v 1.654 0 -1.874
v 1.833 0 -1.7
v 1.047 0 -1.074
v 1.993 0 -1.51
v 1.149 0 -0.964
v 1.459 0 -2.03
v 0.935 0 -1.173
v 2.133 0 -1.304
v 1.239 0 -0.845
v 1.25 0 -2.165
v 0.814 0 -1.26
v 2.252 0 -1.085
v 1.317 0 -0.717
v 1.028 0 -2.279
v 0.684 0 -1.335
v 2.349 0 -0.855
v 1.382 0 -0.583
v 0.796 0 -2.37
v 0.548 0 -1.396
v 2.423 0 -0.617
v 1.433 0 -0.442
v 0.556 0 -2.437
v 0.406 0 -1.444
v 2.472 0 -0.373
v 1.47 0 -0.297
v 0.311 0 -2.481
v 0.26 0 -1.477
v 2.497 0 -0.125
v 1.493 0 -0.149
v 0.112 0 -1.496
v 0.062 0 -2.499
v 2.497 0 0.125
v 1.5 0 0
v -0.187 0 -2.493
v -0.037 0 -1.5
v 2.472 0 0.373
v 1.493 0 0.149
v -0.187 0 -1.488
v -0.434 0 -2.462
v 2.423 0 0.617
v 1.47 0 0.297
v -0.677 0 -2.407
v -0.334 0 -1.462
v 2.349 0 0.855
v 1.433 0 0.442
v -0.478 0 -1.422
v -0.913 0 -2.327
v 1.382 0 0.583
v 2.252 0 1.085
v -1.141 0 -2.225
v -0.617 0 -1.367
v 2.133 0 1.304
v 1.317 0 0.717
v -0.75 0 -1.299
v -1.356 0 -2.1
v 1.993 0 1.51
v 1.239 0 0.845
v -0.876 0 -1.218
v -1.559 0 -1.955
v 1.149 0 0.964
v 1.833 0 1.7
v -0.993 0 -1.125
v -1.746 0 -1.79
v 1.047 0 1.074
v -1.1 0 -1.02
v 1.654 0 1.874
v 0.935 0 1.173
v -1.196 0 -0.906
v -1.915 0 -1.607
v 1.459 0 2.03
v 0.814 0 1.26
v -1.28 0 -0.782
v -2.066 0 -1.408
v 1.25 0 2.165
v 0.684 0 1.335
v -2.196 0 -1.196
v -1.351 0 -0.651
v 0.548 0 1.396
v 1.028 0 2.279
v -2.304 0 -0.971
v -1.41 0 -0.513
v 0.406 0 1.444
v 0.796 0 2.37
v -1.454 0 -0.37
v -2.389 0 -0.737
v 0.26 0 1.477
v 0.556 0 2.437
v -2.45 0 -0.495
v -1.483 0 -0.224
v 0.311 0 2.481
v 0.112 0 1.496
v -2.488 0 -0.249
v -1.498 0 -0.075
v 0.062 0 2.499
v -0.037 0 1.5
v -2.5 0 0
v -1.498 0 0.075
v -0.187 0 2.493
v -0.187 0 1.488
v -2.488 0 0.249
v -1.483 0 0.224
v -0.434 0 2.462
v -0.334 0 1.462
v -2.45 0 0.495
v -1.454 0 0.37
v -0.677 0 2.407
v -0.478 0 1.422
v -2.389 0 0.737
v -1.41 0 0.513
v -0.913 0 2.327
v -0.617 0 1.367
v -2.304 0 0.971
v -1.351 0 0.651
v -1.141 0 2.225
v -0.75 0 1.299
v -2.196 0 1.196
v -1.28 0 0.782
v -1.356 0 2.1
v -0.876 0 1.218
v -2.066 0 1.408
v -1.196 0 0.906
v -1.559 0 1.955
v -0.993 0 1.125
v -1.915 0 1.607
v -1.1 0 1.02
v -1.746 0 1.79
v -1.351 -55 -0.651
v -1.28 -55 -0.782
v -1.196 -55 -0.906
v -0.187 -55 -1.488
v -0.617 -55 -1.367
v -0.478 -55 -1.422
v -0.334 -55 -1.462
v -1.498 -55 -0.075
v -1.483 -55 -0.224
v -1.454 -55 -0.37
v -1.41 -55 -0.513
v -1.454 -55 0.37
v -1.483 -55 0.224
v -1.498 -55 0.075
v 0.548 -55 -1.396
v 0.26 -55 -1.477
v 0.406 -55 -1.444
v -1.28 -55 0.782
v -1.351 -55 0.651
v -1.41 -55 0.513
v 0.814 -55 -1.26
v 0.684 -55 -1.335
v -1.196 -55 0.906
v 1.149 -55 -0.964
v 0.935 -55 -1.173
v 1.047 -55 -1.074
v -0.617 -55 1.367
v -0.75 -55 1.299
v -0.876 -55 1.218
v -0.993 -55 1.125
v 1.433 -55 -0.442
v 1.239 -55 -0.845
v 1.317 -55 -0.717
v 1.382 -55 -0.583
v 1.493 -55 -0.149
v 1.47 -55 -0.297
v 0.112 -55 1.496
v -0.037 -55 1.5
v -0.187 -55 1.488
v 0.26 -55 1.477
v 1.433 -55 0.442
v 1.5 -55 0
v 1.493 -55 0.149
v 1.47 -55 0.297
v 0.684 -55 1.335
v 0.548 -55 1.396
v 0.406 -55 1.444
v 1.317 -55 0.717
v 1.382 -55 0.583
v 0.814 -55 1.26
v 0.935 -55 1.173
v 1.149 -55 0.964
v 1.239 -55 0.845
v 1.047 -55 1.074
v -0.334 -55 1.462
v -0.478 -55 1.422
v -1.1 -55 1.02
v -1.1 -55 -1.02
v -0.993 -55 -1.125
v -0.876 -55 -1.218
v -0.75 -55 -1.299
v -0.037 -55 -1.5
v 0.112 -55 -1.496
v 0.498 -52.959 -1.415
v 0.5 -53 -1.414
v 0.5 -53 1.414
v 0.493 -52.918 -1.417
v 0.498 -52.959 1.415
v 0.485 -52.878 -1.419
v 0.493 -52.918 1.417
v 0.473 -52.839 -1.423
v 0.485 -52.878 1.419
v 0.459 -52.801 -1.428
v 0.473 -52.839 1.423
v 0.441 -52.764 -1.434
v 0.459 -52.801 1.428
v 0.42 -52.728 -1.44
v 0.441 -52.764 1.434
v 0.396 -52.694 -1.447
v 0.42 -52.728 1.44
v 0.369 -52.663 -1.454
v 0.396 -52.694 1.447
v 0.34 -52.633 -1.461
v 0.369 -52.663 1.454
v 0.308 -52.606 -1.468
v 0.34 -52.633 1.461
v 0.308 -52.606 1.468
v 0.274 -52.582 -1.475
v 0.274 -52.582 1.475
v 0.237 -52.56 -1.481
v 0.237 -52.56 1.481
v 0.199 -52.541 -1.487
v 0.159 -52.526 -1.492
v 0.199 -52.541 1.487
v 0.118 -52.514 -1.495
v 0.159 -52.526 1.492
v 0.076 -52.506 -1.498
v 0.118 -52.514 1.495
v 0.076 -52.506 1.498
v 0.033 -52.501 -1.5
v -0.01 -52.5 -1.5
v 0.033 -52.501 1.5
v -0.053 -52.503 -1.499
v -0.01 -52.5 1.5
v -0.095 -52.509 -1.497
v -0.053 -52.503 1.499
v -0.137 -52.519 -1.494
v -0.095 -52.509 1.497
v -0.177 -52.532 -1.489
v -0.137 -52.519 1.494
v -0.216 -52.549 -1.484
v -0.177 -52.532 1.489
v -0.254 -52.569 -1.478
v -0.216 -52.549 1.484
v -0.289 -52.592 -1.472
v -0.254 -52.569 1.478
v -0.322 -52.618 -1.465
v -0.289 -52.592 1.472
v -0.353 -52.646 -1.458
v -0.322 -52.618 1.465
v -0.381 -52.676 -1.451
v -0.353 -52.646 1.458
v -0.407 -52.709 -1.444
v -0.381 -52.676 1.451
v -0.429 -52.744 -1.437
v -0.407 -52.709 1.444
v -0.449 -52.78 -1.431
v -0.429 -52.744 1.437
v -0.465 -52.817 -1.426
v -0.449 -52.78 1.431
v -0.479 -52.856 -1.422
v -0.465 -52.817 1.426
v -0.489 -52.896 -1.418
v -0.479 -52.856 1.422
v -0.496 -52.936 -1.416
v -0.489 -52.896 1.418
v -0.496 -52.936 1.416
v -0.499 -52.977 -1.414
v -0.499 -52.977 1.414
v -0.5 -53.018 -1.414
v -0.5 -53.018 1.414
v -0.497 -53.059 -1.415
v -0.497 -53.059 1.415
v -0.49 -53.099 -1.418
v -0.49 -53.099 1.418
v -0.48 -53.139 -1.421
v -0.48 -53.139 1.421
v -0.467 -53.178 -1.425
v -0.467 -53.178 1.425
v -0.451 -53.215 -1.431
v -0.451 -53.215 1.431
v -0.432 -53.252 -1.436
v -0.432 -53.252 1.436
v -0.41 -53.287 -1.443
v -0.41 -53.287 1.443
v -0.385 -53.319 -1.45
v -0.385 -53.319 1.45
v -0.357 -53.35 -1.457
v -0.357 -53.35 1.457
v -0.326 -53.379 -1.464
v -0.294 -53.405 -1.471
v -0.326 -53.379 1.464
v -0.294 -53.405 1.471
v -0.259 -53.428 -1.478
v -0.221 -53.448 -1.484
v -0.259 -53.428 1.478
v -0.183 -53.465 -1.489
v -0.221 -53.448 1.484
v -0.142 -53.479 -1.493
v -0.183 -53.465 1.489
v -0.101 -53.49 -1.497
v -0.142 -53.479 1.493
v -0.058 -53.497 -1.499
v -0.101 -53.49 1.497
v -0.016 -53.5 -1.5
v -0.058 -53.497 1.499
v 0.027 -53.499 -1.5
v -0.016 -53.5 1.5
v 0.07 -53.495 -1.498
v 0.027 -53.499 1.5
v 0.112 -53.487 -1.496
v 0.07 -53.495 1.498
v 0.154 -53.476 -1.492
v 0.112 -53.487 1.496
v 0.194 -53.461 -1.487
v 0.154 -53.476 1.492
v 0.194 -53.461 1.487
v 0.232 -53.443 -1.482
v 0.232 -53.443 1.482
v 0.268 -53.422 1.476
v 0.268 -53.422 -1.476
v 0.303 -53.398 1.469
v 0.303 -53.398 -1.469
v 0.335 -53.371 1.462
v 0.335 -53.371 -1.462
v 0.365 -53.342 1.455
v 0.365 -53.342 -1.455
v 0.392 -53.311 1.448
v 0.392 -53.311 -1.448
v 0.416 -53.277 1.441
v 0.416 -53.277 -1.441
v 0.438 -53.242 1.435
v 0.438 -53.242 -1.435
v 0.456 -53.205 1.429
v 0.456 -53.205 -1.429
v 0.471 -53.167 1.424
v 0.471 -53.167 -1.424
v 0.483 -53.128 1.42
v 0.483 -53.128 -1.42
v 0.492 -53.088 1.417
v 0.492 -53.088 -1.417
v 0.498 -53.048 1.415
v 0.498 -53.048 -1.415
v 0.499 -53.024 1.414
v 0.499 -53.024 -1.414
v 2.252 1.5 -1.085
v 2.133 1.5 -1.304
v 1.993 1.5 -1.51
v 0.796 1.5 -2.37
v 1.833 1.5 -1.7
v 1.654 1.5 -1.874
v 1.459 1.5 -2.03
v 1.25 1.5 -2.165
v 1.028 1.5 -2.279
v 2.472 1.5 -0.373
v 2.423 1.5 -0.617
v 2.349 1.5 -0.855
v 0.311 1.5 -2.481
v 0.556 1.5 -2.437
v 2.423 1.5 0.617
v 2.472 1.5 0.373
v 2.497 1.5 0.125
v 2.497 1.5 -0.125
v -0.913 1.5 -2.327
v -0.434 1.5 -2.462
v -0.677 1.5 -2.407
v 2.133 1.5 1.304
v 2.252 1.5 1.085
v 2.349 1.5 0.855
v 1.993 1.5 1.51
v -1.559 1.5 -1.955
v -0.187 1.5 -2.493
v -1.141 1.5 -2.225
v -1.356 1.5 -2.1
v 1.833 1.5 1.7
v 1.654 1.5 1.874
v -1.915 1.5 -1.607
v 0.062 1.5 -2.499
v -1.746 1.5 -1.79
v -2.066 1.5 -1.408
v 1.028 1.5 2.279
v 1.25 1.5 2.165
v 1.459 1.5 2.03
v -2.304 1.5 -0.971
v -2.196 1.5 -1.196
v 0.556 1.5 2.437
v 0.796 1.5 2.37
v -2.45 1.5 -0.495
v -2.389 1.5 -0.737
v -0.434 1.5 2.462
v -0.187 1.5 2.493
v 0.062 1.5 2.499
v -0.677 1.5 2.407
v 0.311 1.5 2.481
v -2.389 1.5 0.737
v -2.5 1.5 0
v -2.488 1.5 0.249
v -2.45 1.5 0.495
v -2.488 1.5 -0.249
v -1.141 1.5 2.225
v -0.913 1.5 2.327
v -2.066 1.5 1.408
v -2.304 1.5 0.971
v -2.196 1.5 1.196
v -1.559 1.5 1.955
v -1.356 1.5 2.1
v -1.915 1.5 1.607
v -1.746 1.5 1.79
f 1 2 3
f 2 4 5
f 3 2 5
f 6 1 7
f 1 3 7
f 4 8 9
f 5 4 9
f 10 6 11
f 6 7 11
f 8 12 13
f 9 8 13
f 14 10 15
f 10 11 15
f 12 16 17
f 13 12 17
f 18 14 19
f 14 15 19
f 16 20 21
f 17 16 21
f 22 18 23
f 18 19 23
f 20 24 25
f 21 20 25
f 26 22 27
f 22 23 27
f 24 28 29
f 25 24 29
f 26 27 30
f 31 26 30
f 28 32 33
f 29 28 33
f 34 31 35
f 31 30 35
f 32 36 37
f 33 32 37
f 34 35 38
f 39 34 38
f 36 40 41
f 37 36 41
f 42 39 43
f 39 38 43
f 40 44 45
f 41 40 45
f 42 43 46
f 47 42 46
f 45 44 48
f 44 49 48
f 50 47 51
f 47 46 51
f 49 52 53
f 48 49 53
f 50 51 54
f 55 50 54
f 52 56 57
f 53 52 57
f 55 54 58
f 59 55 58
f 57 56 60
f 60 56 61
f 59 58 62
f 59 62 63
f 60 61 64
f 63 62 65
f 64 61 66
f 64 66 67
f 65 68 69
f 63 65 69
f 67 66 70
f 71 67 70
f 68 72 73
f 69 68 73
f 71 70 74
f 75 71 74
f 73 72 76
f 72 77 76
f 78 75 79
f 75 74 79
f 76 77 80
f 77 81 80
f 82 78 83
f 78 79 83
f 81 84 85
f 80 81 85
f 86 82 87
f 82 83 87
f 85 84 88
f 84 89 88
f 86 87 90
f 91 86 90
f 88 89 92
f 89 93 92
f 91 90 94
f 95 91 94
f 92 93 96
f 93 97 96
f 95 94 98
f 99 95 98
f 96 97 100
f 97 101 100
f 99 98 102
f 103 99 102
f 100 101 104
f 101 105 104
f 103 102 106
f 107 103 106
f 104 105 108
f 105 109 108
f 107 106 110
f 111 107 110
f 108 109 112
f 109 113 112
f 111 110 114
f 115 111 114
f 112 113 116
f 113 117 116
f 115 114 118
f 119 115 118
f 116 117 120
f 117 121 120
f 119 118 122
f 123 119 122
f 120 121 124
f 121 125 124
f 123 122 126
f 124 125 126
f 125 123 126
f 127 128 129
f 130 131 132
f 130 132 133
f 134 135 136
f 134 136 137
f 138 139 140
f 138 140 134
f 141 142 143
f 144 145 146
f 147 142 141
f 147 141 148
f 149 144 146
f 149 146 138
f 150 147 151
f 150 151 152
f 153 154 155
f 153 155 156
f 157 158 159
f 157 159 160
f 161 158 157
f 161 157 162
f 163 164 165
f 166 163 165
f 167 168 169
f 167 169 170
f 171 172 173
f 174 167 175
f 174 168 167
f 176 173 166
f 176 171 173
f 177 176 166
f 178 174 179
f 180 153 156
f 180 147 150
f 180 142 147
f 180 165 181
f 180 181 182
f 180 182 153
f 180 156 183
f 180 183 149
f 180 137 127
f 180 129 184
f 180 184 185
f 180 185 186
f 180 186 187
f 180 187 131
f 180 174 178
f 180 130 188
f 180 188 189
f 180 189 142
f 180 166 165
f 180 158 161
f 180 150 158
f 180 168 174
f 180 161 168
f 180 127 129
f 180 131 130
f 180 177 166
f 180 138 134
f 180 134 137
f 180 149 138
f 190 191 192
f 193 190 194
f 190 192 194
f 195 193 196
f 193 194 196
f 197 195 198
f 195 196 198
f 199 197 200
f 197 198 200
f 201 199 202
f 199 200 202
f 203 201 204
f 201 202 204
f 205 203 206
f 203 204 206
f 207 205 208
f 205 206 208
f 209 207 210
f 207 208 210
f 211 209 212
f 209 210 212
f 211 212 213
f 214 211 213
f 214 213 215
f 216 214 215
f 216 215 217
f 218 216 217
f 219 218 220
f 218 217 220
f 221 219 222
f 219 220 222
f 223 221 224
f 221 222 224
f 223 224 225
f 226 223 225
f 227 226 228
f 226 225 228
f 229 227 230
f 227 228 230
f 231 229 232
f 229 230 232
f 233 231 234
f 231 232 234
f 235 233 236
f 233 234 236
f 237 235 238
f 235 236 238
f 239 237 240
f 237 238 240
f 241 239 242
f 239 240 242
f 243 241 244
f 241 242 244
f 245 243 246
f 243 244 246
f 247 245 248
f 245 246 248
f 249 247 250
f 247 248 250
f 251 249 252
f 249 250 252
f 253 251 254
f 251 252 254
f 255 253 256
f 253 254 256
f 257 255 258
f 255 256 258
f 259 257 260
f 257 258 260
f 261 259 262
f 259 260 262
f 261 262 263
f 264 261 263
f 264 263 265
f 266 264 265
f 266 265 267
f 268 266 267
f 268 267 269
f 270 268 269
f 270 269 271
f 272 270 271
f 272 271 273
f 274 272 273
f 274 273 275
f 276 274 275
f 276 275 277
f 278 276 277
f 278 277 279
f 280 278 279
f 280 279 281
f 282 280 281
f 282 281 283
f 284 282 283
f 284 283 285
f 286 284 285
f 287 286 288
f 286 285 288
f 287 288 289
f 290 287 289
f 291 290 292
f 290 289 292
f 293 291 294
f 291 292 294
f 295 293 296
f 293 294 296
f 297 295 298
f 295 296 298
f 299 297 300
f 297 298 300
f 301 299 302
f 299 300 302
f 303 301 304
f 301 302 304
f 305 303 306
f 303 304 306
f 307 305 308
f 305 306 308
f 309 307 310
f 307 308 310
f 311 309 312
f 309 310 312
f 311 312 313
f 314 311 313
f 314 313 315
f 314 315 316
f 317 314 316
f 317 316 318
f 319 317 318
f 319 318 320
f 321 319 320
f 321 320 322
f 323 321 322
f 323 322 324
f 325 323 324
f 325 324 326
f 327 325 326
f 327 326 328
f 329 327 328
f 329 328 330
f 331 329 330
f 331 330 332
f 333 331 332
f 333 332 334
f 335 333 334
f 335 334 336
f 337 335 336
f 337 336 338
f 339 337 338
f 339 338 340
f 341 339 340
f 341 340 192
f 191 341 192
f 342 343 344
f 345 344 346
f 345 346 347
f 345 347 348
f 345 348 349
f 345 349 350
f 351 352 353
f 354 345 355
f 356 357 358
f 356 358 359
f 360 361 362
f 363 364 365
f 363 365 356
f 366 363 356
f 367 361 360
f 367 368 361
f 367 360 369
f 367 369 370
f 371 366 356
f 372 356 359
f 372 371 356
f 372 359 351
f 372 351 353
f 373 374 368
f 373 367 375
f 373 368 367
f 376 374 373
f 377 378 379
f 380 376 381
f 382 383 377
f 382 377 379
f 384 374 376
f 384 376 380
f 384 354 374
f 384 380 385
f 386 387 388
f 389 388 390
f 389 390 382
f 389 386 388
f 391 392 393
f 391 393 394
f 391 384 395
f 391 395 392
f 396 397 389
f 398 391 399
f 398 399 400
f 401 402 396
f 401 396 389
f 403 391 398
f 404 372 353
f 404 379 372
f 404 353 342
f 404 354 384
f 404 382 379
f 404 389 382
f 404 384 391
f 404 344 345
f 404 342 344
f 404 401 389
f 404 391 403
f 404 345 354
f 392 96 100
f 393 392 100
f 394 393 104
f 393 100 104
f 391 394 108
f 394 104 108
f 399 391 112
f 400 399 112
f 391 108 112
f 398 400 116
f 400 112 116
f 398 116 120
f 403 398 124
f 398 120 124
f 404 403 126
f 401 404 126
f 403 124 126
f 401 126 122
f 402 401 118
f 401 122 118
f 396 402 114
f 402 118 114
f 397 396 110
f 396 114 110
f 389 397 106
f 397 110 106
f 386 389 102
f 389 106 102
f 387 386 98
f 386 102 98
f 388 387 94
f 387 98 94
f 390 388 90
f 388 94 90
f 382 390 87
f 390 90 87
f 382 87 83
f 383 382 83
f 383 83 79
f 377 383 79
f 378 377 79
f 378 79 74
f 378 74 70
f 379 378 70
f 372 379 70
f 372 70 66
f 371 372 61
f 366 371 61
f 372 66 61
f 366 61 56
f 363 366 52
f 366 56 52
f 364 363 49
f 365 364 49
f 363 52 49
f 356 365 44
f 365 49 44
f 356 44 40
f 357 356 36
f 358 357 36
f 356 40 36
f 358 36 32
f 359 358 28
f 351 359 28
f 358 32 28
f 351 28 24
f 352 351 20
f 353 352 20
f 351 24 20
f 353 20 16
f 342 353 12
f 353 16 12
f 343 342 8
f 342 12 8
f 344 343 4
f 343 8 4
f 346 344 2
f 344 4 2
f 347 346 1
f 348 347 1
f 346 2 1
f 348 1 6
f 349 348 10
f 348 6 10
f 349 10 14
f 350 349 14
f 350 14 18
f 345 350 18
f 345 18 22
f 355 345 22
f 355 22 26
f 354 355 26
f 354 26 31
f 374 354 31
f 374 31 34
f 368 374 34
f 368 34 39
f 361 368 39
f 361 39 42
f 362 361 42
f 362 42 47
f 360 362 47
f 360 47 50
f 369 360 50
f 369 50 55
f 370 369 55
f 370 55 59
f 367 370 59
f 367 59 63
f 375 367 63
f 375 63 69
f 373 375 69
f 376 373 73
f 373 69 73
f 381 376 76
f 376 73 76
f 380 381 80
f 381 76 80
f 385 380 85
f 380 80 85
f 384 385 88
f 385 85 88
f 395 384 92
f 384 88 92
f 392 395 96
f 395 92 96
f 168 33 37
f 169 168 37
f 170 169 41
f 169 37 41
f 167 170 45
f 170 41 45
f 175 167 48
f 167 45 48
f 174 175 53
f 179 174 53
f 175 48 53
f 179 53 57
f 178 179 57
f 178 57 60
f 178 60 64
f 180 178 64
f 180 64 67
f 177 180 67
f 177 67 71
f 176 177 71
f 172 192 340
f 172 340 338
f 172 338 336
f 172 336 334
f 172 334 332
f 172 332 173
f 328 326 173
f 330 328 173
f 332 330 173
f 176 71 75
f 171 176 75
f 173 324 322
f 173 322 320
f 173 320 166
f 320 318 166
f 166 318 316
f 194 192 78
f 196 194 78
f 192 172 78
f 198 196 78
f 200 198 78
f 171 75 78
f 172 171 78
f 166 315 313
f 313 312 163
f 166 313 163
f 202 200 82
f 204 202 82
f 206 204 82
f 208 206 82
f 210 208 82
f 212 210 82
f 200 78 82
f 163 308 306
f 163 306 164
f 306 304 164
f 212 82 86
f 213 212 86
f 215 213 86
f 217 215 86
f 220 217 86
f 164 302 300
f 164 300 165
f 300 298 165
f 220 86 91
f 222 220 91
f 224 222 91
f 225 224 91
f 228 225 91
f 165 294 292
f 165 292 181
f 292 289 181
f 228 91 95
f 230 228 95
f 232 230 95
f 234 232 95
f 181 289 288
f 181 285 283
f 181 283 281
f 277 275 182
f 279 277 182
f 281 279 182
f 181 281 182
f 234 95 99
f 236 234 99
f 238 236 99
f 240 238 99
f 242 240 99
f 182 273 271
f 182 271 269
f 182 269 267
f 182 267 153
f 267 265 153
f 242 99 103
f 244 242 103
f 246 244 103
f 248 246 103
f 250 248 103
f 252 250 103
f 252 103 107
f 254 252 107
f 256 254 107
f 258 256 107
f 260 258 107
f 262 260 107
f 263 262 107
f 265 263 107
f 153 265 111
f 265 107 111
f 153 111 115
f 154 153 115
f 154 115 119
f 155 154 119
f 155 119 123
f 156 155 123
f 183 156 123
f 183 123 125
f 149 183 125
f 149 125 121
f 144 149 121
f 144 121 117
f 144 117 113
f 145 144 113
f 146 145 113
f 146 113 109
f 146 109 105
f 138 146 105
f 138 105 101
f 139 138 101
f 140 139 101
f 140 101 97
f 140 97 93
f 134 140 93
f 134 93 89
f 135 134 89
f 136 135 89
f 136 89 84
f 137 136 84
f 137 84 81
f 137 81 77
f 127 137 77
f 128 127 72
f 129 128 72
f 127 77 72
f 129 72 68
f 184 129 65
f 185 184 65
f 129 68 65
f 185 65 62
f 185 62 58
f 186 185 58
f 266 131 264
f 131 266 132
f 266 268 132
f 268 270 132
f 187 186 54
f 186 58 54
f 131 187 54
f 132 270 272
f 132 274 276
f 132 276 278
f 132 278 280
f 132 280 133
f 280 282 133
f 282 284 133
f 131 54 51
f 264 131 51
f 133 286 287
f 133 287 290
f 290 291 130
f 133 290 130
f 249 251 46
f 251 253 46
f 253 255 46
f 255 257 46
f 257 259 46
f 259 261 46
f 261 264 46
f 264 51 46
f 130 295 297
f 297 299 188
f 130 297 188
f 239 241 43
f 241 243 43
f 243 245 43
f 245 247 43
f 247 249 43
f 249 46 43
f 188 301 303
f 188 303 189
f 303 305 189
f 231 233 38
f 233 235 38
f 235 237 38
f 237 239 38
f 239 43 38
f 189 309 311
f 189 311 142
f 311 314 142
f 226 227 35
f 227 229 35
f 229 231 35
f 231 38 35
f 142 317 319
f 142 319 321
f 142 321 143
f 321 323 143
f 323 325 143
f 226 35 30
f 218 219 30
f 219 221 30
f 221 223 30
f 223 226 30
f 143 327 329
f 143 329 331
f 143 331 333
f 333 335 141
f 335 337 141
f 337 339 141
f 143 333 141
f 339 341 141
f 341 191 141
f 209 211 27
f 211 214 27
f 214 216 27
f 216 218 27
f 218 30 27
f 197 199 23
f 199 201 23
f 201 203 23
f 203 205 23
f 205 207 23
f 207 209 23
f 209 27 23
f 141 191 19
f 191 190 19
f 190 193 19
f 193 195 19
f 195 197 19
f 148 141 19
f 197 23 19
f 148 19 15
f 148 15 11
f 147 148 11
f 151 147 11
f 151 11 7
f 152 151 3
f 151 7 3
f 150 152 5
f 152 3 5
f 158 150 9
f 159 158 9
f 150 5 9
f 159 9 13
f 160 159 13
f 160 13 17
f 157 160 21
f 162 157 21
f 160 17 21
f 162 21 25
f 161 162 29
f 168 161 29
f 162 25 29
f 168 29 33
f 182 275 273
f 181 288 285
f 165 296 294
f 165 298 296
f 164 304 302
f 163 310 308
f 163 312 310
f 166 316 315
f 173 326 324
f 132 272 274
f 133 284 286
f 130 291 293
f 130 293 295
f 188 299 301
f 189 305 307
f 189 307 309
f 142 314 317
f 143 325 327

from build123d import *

# Parameters (mm, degrees)
F0_R     = 1.5
F1_DEPTH = 55
F2_R     = 2.5
F2_R_2   = 1.5
F3_DEPTH = 1.5
F4_R     = 0.5
F5_DEPTH = 2.5


with BuildPart() as f1:
    # F0 (on Front) → F1 (new body)
    with BuildSketch(Plane.XZ):
        Circle(F0_R)
    extrude(amount=F1_DEPTH)

    # F2 (on face) → F3 (join)
    with BuildSketch(Plane(origin=(0, 0, 0), x_dir=(-1, 0, 0), z_dir=(0, 1, 0))):
        Circle(F2_R)
        Circle(F2_R_2, mode=Mode.SUBTRACT)
        Circle(F2_R_2)
    extrude(amount=F3_DEPTH)

    # F4 (on Top) → F5 (cut, symmetric)
    with BuildSketch(Plane.XY):
        with Locations((0, -53)):
            Circle(F4_R)
    extrude(amount=F5_DEPTH, both=True, mode=Mode.SUBTRACT)


solid = f1.part
